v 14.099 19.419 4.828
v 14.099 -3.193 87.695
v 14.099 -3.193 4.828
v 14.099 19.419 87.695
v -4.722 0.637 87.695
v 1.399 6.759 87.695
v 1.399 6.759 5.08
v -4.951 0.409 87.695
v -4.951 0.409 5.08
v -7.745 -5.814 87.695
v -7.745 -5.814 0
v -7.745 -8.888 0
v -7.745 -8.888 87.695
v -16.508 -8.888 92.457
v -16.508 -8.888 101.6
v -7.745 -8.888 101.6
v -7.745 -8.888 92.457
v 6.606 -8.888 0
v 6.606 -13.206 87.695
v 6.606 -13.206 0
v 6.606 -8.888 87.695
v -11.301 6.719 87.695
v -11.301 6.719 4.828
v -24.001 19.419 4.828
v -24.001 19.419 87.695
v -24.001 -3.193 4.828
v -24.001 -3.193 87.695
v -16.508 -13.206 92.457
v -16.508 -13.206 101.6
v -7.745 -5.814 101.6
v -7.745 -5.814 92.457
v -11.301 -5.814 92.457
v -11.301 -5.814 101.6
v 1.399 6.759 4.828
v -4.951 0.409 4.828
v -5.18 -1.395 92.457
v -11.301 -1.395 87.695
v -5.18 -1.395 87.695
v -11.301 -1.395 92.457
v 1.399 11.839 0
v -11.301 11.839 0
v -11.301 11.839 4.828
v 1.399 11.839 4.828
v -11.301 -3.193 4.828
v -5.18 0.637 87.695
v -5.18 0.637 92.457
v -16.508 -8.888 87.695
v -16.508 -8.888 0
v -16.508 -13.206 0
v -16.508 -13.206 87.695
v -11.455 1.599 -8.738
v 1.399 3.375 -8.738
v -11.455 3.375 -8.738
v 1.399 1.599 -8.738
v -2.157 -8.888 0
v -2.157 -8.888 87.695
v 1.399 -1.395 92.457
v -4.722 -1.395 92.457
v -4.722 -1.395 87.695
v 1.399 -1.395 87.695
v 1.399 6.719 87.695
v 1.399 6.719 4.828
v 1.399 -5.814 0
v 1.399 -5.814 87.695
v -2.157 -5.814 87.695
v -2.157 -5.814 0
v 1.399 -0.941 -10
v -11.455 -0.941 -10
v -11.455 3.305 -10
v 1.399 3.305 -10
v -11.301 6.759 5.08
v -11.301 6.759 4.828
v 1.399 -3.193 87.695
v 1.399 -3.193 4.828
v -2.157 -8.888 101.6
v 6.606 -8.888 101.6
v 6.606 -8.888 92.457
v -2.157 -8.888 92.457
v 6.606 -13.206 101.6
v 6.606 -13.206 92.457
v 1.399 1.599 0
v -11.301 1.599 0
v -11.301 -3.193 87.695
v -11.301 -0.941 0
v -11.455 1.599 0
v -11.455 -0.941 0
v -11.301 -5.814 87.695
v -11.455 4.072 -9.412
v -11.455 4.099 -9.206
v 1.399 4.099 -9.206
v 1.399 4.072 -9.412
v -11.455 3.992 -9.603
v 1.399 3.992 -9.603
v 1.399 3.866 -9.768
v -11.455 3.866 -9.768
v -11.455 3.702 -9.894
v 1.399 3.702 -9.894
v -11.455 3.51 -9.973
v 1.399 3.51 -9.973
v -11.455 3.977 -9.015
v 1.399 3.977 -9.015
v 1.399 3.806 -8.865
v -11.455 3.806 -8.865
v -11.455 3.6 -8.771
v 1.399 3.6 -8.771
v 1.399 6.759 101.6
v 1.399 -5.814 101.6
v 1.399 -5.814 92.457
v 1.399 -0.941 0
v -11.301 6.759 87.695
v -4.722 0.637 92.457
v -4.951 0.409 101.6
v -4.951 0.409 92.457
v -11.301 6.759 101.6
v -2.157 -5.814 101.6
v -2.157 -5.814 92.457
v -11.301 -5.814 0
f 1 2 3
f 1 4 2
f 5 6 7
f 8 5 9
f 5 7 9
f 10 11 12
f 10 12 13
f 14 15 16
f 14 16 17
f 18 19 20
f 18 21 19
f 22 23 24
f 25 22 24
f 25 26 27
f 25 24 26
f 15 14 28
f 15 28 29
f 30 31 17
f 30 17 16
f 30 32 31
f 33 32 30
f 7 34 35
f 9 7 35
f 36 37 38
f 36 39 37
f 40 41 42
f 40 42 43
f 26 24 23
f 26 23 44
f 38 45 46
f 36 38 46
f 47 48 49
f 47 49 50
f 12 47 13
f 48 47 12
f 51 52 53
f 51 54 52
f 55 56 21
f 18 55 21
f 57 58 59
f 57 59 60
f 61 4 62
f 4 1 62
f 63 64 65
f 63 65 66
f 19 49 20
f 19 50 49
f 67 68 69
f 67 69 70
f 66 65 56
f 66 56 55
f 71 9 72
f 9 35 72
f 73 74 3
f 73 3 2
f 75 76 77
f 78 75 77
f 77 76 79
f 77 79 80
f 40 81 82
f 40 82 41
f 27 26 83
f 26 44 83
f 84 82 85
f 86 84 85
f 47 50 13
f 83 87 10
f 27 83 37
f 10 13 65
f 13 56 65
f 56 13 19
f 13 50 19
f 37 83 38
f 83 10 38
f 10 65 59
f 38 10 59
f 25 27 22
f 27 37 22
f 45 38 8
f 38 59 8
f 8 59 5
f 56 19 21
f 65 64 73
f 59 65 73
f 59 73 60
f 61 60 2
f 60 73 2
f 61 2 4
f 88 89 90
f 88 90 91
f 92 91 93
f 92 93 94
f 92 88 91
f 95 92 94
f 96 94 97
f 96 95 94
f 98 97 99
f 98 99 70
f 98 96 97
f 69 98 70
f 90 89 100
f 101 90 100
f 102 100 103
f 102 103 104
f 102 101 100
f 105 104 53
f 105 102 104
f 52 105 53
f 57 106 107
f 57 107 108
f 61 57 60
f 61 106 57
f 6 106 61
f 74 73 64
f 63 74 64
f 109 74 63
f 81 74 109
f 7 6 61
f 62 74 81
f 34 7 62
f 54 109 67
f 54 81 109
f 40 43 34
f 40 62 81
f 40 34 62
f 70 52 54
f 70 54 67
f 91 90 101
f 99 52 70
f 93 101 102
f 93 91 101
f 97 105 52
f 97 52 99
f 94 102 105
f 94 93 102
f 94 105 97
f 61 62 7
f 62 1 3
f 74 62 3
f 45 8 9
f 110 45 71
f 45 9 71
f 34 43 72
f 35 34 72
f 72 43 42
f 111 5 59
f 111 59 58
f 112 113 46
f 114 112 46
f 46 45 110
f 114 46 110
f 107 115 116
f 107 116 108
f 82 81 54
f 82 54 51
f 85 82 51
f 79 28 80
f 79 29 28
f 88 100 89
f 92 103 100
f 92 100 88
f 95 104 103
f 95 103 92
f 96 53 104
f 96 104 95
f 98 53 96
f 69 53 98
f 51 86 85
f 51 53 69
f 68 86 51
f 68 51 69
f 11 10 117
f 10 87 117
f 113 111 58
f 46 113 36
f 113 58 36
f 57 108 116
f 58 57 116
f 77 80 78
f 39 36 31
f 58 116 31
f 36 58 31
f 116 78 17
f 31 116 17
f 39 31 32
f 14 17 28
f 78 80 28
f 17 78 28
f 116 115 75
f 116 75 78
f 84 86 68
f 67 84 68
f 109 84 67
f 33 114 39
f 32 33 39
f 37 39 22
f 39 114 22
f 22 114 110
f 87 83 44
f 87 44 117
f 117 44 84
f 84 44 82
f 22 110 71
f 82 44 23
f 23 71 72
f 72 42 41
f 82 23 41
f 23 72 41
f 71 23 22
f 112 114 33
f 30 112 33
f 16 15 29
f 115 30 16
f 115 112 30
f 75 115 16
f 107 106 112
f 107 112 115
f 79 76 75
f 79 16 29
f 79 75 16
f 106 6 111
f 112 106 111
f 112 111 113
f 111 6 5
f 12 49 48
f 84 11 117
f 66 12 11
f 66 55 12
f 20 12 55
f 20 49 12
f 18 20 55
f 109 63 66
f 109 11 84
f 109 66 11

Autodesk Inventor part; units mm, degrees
ref_plane "YZ Plane" through (0, 0, 0) normal (1, 0, 0) x (0, 1, 0)
ref_plane "XZ Plane" through (0, 0, 0) normal (0, 1, 0) x (-1, 0, 0)
ref_plane "XY Plane" through (0, 0, 0) normal (0, 0, 1) x (1, 0, 0)
sketch "Sketch1" plane through (0, 0, 0) normal (0, 0, 1) x (1, 0, 0)
  line L0 (-11.300905, 6.75881) -> (1.399095, 6.75881)
  line L1 (1.399095, 6.75881) -> (1.399095, -5.94119)
  line L2 (1.399095, -5.94119) -> (-11.300905, -5.94119)
  line L3 (-11.300905, -5.94119) -> (-11.300905, 6.75881)
  line L4 (-11.300905, 6.75881) -> (-1.742504, 6.75881) construction
  line L5 (-11.300905, 6.75881) -> (-4.950905, 0.40881)
  line L6 (1.399095, 6.75881) -> (-4.950905, 0.40881)
  point P0 (0, 0)
  dimension "d0" = 12.7
  dimension "d1" = 12.7
sketch "Sketch1 outline for Extrusion1" plane through (0, 0, 0) normal (0, 0, 1) x (1, 0, 0)
  line L0 (-4.950905, 0.40881) -> (-11.300905, 6.75881)
  line L1 (1.399095, 6.75881) -> (-4.950905, 0.40881)
  line L2 (1.399095, -5.94119) -> (1.399095, 6.75881)
  line L3 (-11.300905, -5.94119) -> (1.399095, -5.94119)
  line L4 (-11.300905, 6.75881) -> (-11.300905, -5.94119)
extrude "Extrusion1" add sketch "Sketch1 outline for Extrusion1" along normal blind 101.6
sketch "Sketch1 outline for Extrusion2" plane through (0, 0, 0) normal (0, 0, 1) x (1, 0, 0)
  line L0 (1.399095, 6.75881) -> (-11.300905, 6.75881)
  line L1 (-4.950905, 0.40881) -> (1.399095, 6.75881)
  line L2 (-11.300905, 6.75881) -> (-4.950905, 0.40881)
extrude "Extrusion2" add sketch "Sketch1 outline for Extrusion2" along normal blind 5.08
sketch "Sketch2" plane through (-11.300905, 6.75881, 0) normal (0, 1, 0) x (1, 0, 0)
  line L0 (0, 0) -> (0, -101.6)
  line L1 (12.7, 0) -> (12.7, -101.6)
  line L2 (0, 0) -> (12.7, 0)
  line L3 (12.7, 0) -> (12.7, -5.078457)
  line L4 (12.7, -5.078457) -> (0, -5.078457)
  line L5 (0, -5.078457) -> (0, 0)
  point P0 (11.300905, 0)
sketch "Sketch2 outline for Extrusion3" plane through (-11.300905, 6.75881, 0) normal (0, 1, 0) x (1, 0, 0)
  line L0 (0, 0) -> (12.7, 0)
  line L1 (12.7, 0) -> (12.7, -5.078457)
  line L2 (12.7, -5.078457) -> (0, -5.078457)
  line L3 (0, -5.078457) -> (0, 0)
extrude "Extrusion3" add sketch "Sketch2 outline for Extrusion3" along normal blind 5.08
sketch "Sketch3" plane through (-11.300905, -5.94119, 0) normal (0, -1, 0) x (1, 0, 0)
  line L0 (12.7, 101.6) -> (6.35, 101.6) projected
  line L1 (0, 0) -> (12.7, 0) projected
  line L2 (9.4615, 101.6) -> (3.2385, 101.6)
  line L3 (3.2385, 101.6) -> (3.2385, 0)
  line L4 (3.2385, 0) -> (9.4615, 0)
  line L5 (9.4615, 0) -> (9.4615, 101.6)
  line L6 (6.35, 5.08) -> (6.35, 101.6) construction
  point P0 (11.300905, 0)
  dimension "d9" = 6.223
sketch "Sketch3 outline for Extrusion4" plane through (-11.300905, -5.94119, 0) normal (0, -1, 0) x (1, 0, 0)
  line L0 (9.4615, 0) -> (9.4615, 101.6)
  line L1 (3.2385, 0) -> (9.4615, 0)
  line L2 (3.2385, 101.6) -> (3.2385, 0)
  line L3 (9.4615, 101.6) -> (3.2385, 101.6)
extrude "Extrusion4" add sketch "Sketch3 outline for Extrusion4" along normal blind 7.3914
sketch "Sketch4" plane through (-1.839405, -5.94119, 101.6) normal (1, 0, 0) x (0, 0, -1)
  line L0 (101.6, -7.3914) -> (0, -7.3914) projected
  line L1 (101.6, 0) -> (101.6, -7.3914) projected
  line L2 (0, -7.3914) -> (101.6, -7.3914)
  line L3 (101.6, -7.3914) -> (101.6, -2.4384)
  line L4 (101.6, -2.4384) -> (0, -2.4384)
  line L5 (0, -2.4384) -> (0, -7.3914)
  point P0 (101.6, 5.94119)
  dimension "d12" = 4.953
sketch "Sketch5" plane through (-8.062405, -5.94119, 0) normal (-1, 0, 0) x (0, 0, 1)
  line L0 (0, -7.3914) -> (101.6, -7.3914) projected
  line L1 (0, 0) -> (0, -7.3914) projected
  line L2 (101.6, -7.3914) -> (0, -7.3914)
  line L3 (0, -7.3914) -> (0, -2.4384)
  line L4 (0, -2.4384) -> (101.6, -2.4384)
  line L5 (101.6, -2.4384) -> (101.6, -7.3914)
  point P0 (0, 5.94119)
  dimension "d13" = 4.953
sketch "Sketch5 outline for Extrusion5" plane through (-8.062405, -5.94119, 0) normal (-1, 0, 0) x (0, 0, 1)
  line L0 (0, -7.3914) -> (101.6, -7.3914)
  line L1 (0, -2.4384) -> (0, -7.3914)
  line L2 (101.6, -2.4384) -> (0, -2.4384)
  line L3 (101.6, -7.3914) -> (101.6, -2.4384)
extrude "Extrusion5" add sketch "Sketch5 outline for Extrusion5" along normal blind 8.763
sketch "Sketch4 outline for Extrusion6" plane through (-1.839405, -5.94119, 101.6) normal (1, 0, 0) x (0, 0, -1)
  line L0 (101.6, -7.3914) -> (101.6, -2.4384)
  line L1 (0, -7.3914) -> (101.6, -7.3914)
  line L2 (0, -2.4384) -> (0, -7.3914)
  line L3 (101.6, -2.4384) -> (0, -2.4384)
extrude "Extrusion6" add sketch "Sketch4 outline for Extrusion6" along normal blind 8.763
sketch "Sketch6" plane through (0, 0, 0) normal (0, 0, -1) x (-1, 0, 0)
  line L0 (-1.399095, -5.94119) -> (-1.399095, 6.75881)
  line L1 (-1.399095, 1.59881) -> (11.455496, 1.59881)
  line L2 (11.455496, 1.59881) -> (11.455496, -0.94119)
  line L3 (11.455496, -0.94119) -> (-1.399095, -0.94119)
  line L4 (-1.399095, -0.94119) -> (-1.399095, 1.59881)
  line L5 (11.300905, -5.94119) -> (8.062405, -5.94119)
  point P0 (0, 0)
  dimension "d18" = 2.54
  dimension "d19" = 5
sketch "Sketch6 outline for Extrusion7" plane through (0, 0, 0) normal (0, 0, -1) x (-1, 0, 0)
  line L0 (-1.399095, 1.59881) -> (11.455496, 1.59881)
  line L1 (11.455496, 1.59881) -> (11.455496, -0.94119)
  line L2 (11.455496, -0.94119) -> (-1.399095, -0.94119)
  line L3 (-1.399095, -0.94119) -> (-1.399095, 1.59881)
extrude "Extrusion7" add sketch "Sketch6 outline for Extrusion7" along normal blind 10
sketch "Sketch7" plane through (-11.300905, 1.59881, 0) normal (0, 1, 0) x (1, 0, 0)
  line L0 (-0.154591, 0) -> (-0.154591, 10)
  line L1 (12.7, 0) -> (12.7, 10)
  line L2 (-0.154591, 10) -> (12.7, 10)
  line L3 (12.7, 10) -> (12.7, 8.73819)
  line L4 (12.7, 8.73819) -> (-0.154591, 8.73819)
  line L5 (-0.154591, 8.73819) -> (-0.154591, 10)
  point P0 (11.300905, 0)
sketch "Sketch7 outline for Extrusion8" plane through (-11.300905, 1.59881, 0) normal (0, 1, 0) x (1, 0, 0)
  line L0 (-0.154591, 10) -> (12.7, 10)
  line L1 (12.7, 10) -> (12.7, 8.73819)
  line L2 (12.7, 8.73819) -> (-0.154591, 8.73819)
  line L3 (-0.154591, 8.73819) -> (-0.154591, 10)
extrude "Extrusion8" add sketch "Sketch7 outline for Extrusion8" along normal blind 2.5
fillet "Fillet1" radius 0.79375 2 edges at (-5.0282, 4.0988, -10) (-5.0282, 4.0988, -8.7382)
sketch "Sketch8" plane through (-11.300905, -13.33259, 0) normal (0, -1, 0) x (1, 0, 0)
  line L0 (18.2245, 101.6) -> (18.2245, 0)
  line L1 (-5.5245, 0) -> (-5.5245, 101.6)
  line L2 (18.2245, 92.457351) -> (-5.5245, 92.457351)
  line L3 (-5.5245, 92.457351) -> (-5.5245, 87.694851)
  line L4 (-5.5245, 87.694851) -> (18.2245, 87.694851)
  line L5 (18.2245, 87.694851) -> (18.2245, 92.457351)
  point P0 (11.300905, 0)
  dimension "d25" = 4.7625
sketch "Sketch8 outline for Extrusion9" plane through (-11.300905, -13.33259, 0) normal (0, -1, 0) x (1, 0, 0)
  line L0 (18.2245, 87.694851) -> (18.2245, 92.457351)
  line L1 (-5.5245, 87.694851) -> (18.2245, 87.694851)
  line L2 (-5.5245, 92.457351) -> (-5.5245, 87.694851)
  line L3 (18.2245, 92.457351) -> (-5.5245, 92.457351)
extrude "Extrusion9" cut sketch "Sketch8 outline for Extrusion9" against normal blind 13.97
sketch "Sketch9" plane through (-11.300905, -13.33259, 0) normal (0, -1, 0) x (1, 0, 0)
  line L0 (-5.5245, 101.6) -> (18.2245, 101.6) projected
  line L1 (3.2385, 0) -> (-5.5245, 0) projected
  line L2 (18.2245, 101.6) -> (-5.5245, 101.6)
  line L3 (-5.5245, 101.6) -> (-5.5245, 0)
  line L4 (-5.5245, 0) -> (18.2245, 0)
  line L5 (18.2245, 0) -> (18.2245, 101.6)
  point P0 (11.300905, 0)
sketch "Sketch9 outline for Extrusion10" plane through (-11.300905, -13.33259, 0) normal (0, -1, 0) x (1, 0, 0)
  line L0 (18.2245, 0) -> (18.2245, 101.6)
  line L1 (-5.5245, 0) -> (18.2245, 0)
  line L2 (-5.5245, 101.6) -> (-5.5245, 0)
  line L3 (18.2245, 101.6) -> (-5.5245, 101.6)
extrude "Extrusion10" cut sketch "Sketch9 outline for Extrusion10" against normal blind 0.127
sketch "Sketch10" plane through (-1.839405, -5.94119, 101.6) normal (0, -1, 0) x (1, 0, 0)
  line L0 (3.2385, -9.142649) -> (3.2385, 0)
  line L1 (0, -13.905149) -> (0, -101.6)
  line L2 (3.2385, 0) -> (0, 0)
  line L3 (0, 0) -> (0, -101.6)
  line L4 (0, -101.6) -> (3.2385, -101.6)
  line L5 (3.2385, -101.6) -> (3.2385, 0)
  line L6 (-9.4615, -9.142649) -> (-9.4615, 0)
  line L7 (-9.4615, -101.6) -> (3.2385, -101.6)
  line L8 (-9.4615, 0) -> (-5.941969, 0)
  line L9 (-5.941969, 0) -> (-5.941969, -101.6)
  line L10 (-5.941969, -101.6) -> (-9.4615, -101.6)
  line L11 (-9.4615, -101.6) -> (-9.4615, 0)
  point P0 (1.839405, -101.6)
sketch "Sketch10 outline for Extrusion11" plane through (-1.839405, -5.94119, 101.6) normal (0, -1, 0) x (1, 0, 0)
  line L0 (3.2385, -101.6) -> (3.2385, 0)
  line L1 (0, -101.6) -> (3.2385, -101.6)
  line L2 (0, 0) -> (0, -101.6)
  line L3 (3.2385, 0) -> (0, 0)
  line L4 (-9.4615, -101.6) -> (-5.941969, -101.6)
  line L5 (-9.4615, 0) -> (-9.4615, -101.6)
  line L6 (-5.941969, 0) -> (-9.4615, 0)
  line L7 (-5.941969, -101.6) -> (-5.941969, 0)
extrude "Extrusion11" cut sketch "Sketch10 outline for Extrusion11" against normal blind 0.127
sketch "Sketch11" plane through (6.923595, -5.94119, 101.6) normal (1, 0, 0) x (0, 0, -1)
  line L0 (0, -2.4384) -> (9.142649, -2.4384)
  line L1 (0, -2.4384) -> (101.6, -2.4384)
  line L2 (101.6, -2.4384) -> (101.6, -7.2644)
  line L3 (101.6, -7.2644) -> (0, -7.2644)
  line L4 (0, -7.2644) -> (0, -2.4384)
  point P0 (101.6, 5.94119)
sketch "Sketch11 outline for Extrusion12" plane through (6.923595, -5.94119, 101.6) normal (1, 0, 0) x (0, 0, -1)
  line L0 (0, -2.4384) -> (101.6, -2.4384)
  line L1 (101.6, -2.4384) -> (101.6, -7.2644)
  line L2 (101.6, -7.2644) -> (0, -7.2644)
  line L3 (0, -7.2644) -> (0, -2.4384)
extrude "Extrusion12" cut sketch "Sketch11 outline for Extrusion12" against normal blind 0.0635
sketch "Sketch12" plane through (-16.825405, -5.94119, 0) normal (-1, 0, 0) x (0, 0, 1)
  line L0 (101.6, -7.2644) -> (101.6, -2.4384) projected
  line L1 (0, 0) -> (0, -2.4384) projected
  line L2 (101.6, -7.2644) -> (0, -7.2644)
  line L3 (0, -7.2644) -> (0, -2.4384)
  line L4 (0, -2.4384) -> (101.6, -2.4384)
  line L5 (101.6, -2.4384) -> (101.6, -7.2644)
  point P0 (0, 5.94119)
sketch "Sketch12 outline for Extrusion13" plane through (-16.825405, -5.94119, 0) normal (-1, 0, 0) x (0, 0, 1)
  line L0 (101.6, -7.2644) -> (0, -7.2644)
  line L1 (0, -7.2644) -> (0, -2.4384)
  line L2 (0, -2.4384) -> (101.6, -2.4384)
  line L3 (101.6, -2.4384) -> (101.6, -7.2644)
extrude "Extrusion13" cut sketch "Sketch12 outline for Extrusion13" against normal blind 0.0635
sketch "Sketch13" plane through (-7.781374, -5.94119, 92.457351) normal (-1, 0, 0) x (0, 0, 1)
  line L0 (-92.457351, 0.127) -> (-4.7625, 0.127)
  line L1 (9.142649, -2.4384) -> (9.142649, 0.127)
  line L2 (-92.457351, 0.127) -> (9.142649, 0.127)
  line L3 (9.142649, 0.127) -> (9.142649, 0.002557)
  line L4 (9.142649, 0.002557) -> (-92.457351, 0.002557)
  line L5 (-92.457351, 0.002557) -> (-92.457351, 0.127)
  point P0 (-92.457351, 5.94119)
sketch "Sketch14" plane through (-7.781374, -5.94119, 0) normal (-1, 0, 0) x (0, 0, 1)
  line L0 (0, 0.127) -> (87.694851, 0.127)
  line L1 (92.457351, 0) -> (101.6, 0)
  line L2 (0, 0.127) -> (101.6, 0.127)
  line L3 (101.6, 0.127) -> (101.6, 0)
  line L4 (101.6, 0) -> (0, 0)
  line L5 (0, 0) -> (0, 0.127)
  point P0 (0, 5.94119)
sketch "Sketch14 outline for Extrusion14" plane through (-7.781374, -5.94119, 0) normal (-1, 0, 0) x (0, 0, 1)
  line L0 (0, 0.127) -> (101.6, 0.127)
  line L1 (101.6, 0.127) -> (101.6, 0)
  line L2 (101.6, 0) -> (0, 0)
  line L3 (0, 0) -> (0, 0.127)
extrude "Extrusion14" add sketch "Sketch14 outline for Extrusion14" along normal blind 0.28194
sketch "Sketch15" plane through (-1.839405, -8.37959, 87.694851) normal (1, 0, 0) x (0, 0, -1)
  line L0 (-4.7625, 2.5654) -> (-13.905149, 2.5654)
  line L1 (87.694851, 2.4384) -> (87.694851, 0)
  line L2 (-13.905149, 2.5654) -> (87.694851, 2.5654)
  line L3 (87.694851, 2.5654) -> (87.694851, 0)
  line L4 (87.694851, 0) -> (-13.905149, 0)
  line L5 (-13.905149, 0) -> (-13.905149, 2.5654)
  point P0 (87.694851, 8.37959)
sketch "Sketch15 outline for Extrusion15" plane through (-1.839405, -8.37959, 87.694851) normal (1, 0, 0) x (0, 0, -1)
  line L0 (-13.905149, 2.5654) -> (87.694851, 2.5654)
  line L1 (87.694851, 2.5654) -> (87.694851, 0)
  line L2 (87.694851, 0) -> (-13.905149, 0)
  line L3 (-13.905149, 0) -> (-13.905149, 2.5654)
extrude "Extrusion15" cut sketch "Sketch15 outline for Extrusion15" against normal blind 0.0635
sketch "Sketch16" plane through (-8.062405, -8.37959, 0) normal (-1, 0, 0) x (0, 0, 1)
  line L0 (101.6, 2.5654) -> (92.457351, 2.5654)
  line L1 (0, -4.826) -> (0, 0)
  line L2 (101.6, 2.5654) -> (0, 2.5654)
  line L3 (0, 2.5654) -> (0, 0)
  line L4 (0, 0) -> (101.6, 0)
  line L5 (101.6, 0) -> (101.6, 2.5654)
  point P0 (0, 8.37959)
sketch "Sketch16 outline for Extrusion16" plane through (-8.062405, -8.37959, 0) normal (-1, 0, 0) x (0, 0, 1)
  line L0 (101.6, 0) -> (101.6, 2.5654)
  line L1 (0, 0) -> (101.6, 0)
  line L2 (0, 2.5654) -> (0, 0)
  line L3 (101.6, 2.5654) -> (0, 2.5654)
extrude "Extrusion16" cut sketch "Sketch16 outline for Extrusion16" against normal blind 0.0635
sketch "Sketch17" plane through (-11.300905, 0.63741, 0) normal (0, -1, 0) x (1, 0, 0)
  point P0 (11.300905, 0)
sketch "Sketch18" plane through (6.860095, -8.37959, 101.6) normal (0, 1, 0) x (1, 0, 0)
  line L0 (0, 0) -> (0, 9.142649)
  line L1 (-8.763, 9.142649) -> (0, 9.142649)
  line L2 (0, 0) -> (-8.763, 0)
  line L3 (-8.763, 0) -> (-8.763, 9.142649)
  line L4 (-8.763, 9.142649) -> (0, 9.142649)
  line L5 (0, 9.142649) -> (0, 0)
  line L6 (-14.859, 0) -> (-23.622, 0)
  line L7 (-14.859, 9.142649) -> (-23.622, 9.142649)
  line L8 (-14.859, 0) -> (-23.622, 0)
  line L9 (-23.622, 0) -> (-23.622, 9.142649)
  line L10 (-23.622, 9.142649) -> (-14.859, 9.142649)
  line L11 (-14.859, 9.142649) -> (-14.859, 0)
  line L12 (-8.763, 13.905149) -> (0, 13.905149)
  line L13 (-5.461, 101.6) -> (-18.161, 101.6)
  line L14 (0, 13.905149) -> (-8.763, 13.905149)
  line L15 (-8.763, 13.905149) -> (-8.763, 101.6)
  line L16 (-8.763, 101.6) -> (0, 101.6)
  line L17 (0, 101.6) -> (0, 13.905149)
  line L18 (-23.622, 13.905149) -> (-14.859, 13.905149)
  line L19 (-14.923409, 101.6) -> (-14.923409, 13.905149)
  line L20 (-23.622, 13.905149) -> (-14.923409, 13.905149)
  line L21 (-14.923409, 13.905149) -> (-14.923409, 101.6)
  line L22 (-14.923409, 101.6) -> (-23.622, 101.6)
  line L23 (-23.622, 101.6) -> (-23.622, 13.905149)
  point P0 (-6.860095, 101.6)
sketch "Sketch18 outline for Extrusion17" plane through (6.860095, -8.37959, 101.6) normal (0, 1, 0) x (1, 0, 0)
  line L0 (-8.763, 0) -> (0, 0)
  line L1 (-8.763, 9.142649) -> (-8.763, 0)
  line L2 (0, 9.142649) -> (-8.763, 9.142649)
  line L3 (0, 0) -> (0, 9.142649)
  line L4 (-14.859, 0) -> (-23.622, 0)
  line L5 (-23.622, 0) -> (-23.622, 9.142649)
  line L6 (-23.622, 9.142649) -> (-14.859, 9.142649)
  line L7 (-14.859, 9.142649) -> (-14.859, 0)
  line L8 (-14.923409, 13.905149) -> (-14.923409, 101.6)
  line L9 (-23.622, 13.905149) -> (-14.923409, 13.905149)
  line L10 (-23.622, 101.6) -> (-23.622, 13.905149)
  line L11 (-14.923409, 101.6) -> (-23.622, 101.6)
  line L12 (-8.763, 13.905149) -> (0, 13.905149)
  line L13 (-8.763, 101.6) -> (-8.763, 13.905149)
  line L14 (0, 101.6) -> (-8.763, 101.6)
  line L15 (0, 13.905149) -> (0, 101.6)
extrude "Extrusion17" cut sketch "Sketch18 outline for Extrusion17" against normal blind 0.508
sketch "Sketch19" plane through (6.860095, -5.94119, 101.6) normal (1, 0, 0) x (0, 0, -1)
  line L0 (0, 0.127) -> (0, -2.9464)
  line L1 (13.905149, -7.2644) -> (101.6, -7.2644)
  line L2 (0, -2.9464) -> (101.6, -2.9464)
  line L3 (101.6, -2.9464) -> (101.6, -7.2644)
  line L4 (101.6, -7.2644) -> (0, -7.2644)
  line L5 (0, -7.2644) -> (0, -2.9464)
  point P0 (101.6, 5.94119)
sketch "Sketch19 outline for Extrusion18" plane through (6.860095, -5.94119, 101.6) normal (1, 0, 0) x (0, 0, -1)
  line L0 (0, -2.9464) -> (101.6, -2.9464)
  line L1 (101.6, -2.9464) -> (101.6, -7.2644)
  line L2 (101.6, -7.2644) -> (0, -7.2644)
  line L3 (0, -7.2644) -> (0, -2.9464)
extrude "Extrusion18" cut sketch "Sketch19 outline for Extrusion18" against normal blind 0.254
sketch "Sketch20" plane through (-16.761905, -5.94119, 0) normal (-1, 0, 0) x (0, 0, 1)
  line L0 (87.694851, -2.9464) -> (0, -2.9464)
  line L1 (101.6, -7.2644) -> (92.457351, -7.2644)
  line L2 (0, -2.9464) -> (101.6, -2.9464)
  line L3 (101.6, -2.9464) -> (101.6, -7.2644)
  line L4 (101.6, -7.2644) -> (0, -7.2644)
  line L5 (0, -7.2644) -> (0, -2.9464)
  point P0 (0, 5.94119)
sketch "Sketch20 outline for Extrusion19" plane through (-16.761905, -5.94119, 0) normal (-1, 0, 0) x (0, 0, 1)
  line L0 (0, -2.9464) -> (101.6, -2.9464)
  line L1 (101.6, -2.9464) -> (101.6, -7.2644)
  line L2 (101.6, -7.2644) -> (0, -7.2644)
  line L3 (0, -7.2644) -> (0, -2.9464)
extrude "Extrusion19" cut sketch "Sketch20 outline for Extrusion19" against normal blind 0.254
sketch "Sketch21" plane through (-11.300905, 6.75881, 5.08) normal (-1, 0, 0) x (0, 0, 1)
  line L0 (82.614851, -12.573) -> (-5.08, -12.573)
  line L1 (96.52, -12.573) -> (96.52, -15.6464)
  line L2 (-5.08, -12.573) -> (96.52, -12.573)
  line L3 (96.52, -12.573) -> (96.52, -15.6464)
  line L4 (96.52, -15.6464) -> (-5.08, -15.6464)
  line L5 (-5.08, -15.6464) -> (-5.08, -12.573)
  point P0 (-5.08, -6.75881)
sketch "Sketch21 outline for Extrusion20" plane through (-11.300905, 6.75881, 5.08) normal (-1, 0, 0) x (0, 0, 1)
  line L0 (-5.08, -12.573) -> (96.52, -12.573)
  line L1 (96.52, -12.573) -> (96.52, -15.6464)
  line L2 (96.52, -15.6464) -> (-5.08, -15.6464)
  line L3 (-5.08, -15.6464) -> (-5.08, -12.573)
extrude "Extrusion20" cut sketch "Sketch21 outline for Extrusion20" against normal blind 3.302
sketch "Sketch22" plane through (-1.902905, -8.37959, 87.694851) normal (1, 0, 0) x (0, 0, -1)
  line L0 (0, 2.5654) -> (87.694851, 2.5654)
  line L1 (-4.7625, -0.508) -> (-13.905149, -0.508)
  line L2 (87.694851, 2.5654) -> (-13.905149, 2.5654)
  line L3 (-13.905149, 2.5654) -> (-13.905149, -0.508)
  line L4 (-13.905149, -0.508) -> (87.694851, -0.508)
  line L5 (87.694851, -0.508) -> (87.694851, 2.5654)
  point P0 (87.694851, 8.37959)
sketch "Sketch22 outline for Extrusion21" plane through (-1.902905, -8.37959, 87.694851) normal (1, 0, 0) x (0, 0, -1)
  line L0 (87.694851, -0.508) -> (87.694851, 2.5654)
  line L1 (-13.905149, -0.508) -> (87.694851, -0.508)
  line L2 (-13.905149, 2.5654) -> (-13.905149, -0.508)
  line L3 (87.694851, 2.5654) -> (-13.905149, 2.5654)
extrude "Extrusion21" cut sketch "Sketch22 outline for Extrusion21" against normal blind 0.254
sketch "Sketch23" plane through (-7.998905, -8.37959, 0) normal (-1, 0, 0) x (0, 0, 1)
  line L0 (87.694851, 2.5654) -> (0, 2.5654)
  line L1 (0, 2.5654) -> (101.6, 2.5654)
  line L2 (101.6, 2.5654) -> (101.6, -0.508)
  line L3 (101.6, -0.508) -> (0, -0.508)
  line L4 (0, -0.508) -> (0, 2.5654)
  point P0 (0, 8.37959)
sketch "Sketch23 outline for Extrusion22" plane through (-7.998905, -8.37959, 0) normal (-1, 0, 0) x (0, 0, 1)
  line L0 (0, 2.5654) -> (101.6, 2.5654)
  line L1 (101.6, 2.5654) -> (101.6, -0.508)
  line L2 (101.6, -0.508) -> (0, -0.508)
  line L3 (0, -0.508) -> (0, 2.5654)
extrude "Extrusion22" cut sketch "Sketch23 outline for Extrusion22" against normal blind 0.254
sketch "Sketch24" plane through (1.399095, 6.75881, 101.6) normal (1, 0, 0) x (0, 0, -1)
  point P0 (101.6, -6.75881)
sketch "Sketch25" plane through (0, 0, 5.08) normal (0, 0, 1) x (1, 0, 0)
  line L0 (1.399095, 6.75881) -> (-4.950905, 0.40881)
  line L1 (-4.950905, 0.40881) -> (-25.57382, 21.031726)
  line L2 (-25.57382, 21.031726) -> (15.67201, 21.031726)
  line L3 (15.67201, 21.031726) -> (-4.950905, 0.40881)
  point P0 (0, 0)
sketch "Sketch26" plane through (1.399095, 6.75881, 101.6) normal (1, 0, 0) x (0, 0, -1)
  line L0 (101.6, -12.573) -> (13.905149, -12.573)
  line L1 (13.905149, -12.573) -> (96.533031, -12.573)
  line L2 (96.533031, -12.573) -> (96.533031, 14.285186)
  line L3 (96.533031, 14.285186) -> (13.905149, 14.285186)
  line L4 (13.905149, 14.285186) -> (13.905149, -12.573)
  point P0 (101.6, -6.75881)
sketch "Sketch26 outline for Extrusion23" plane through (1.399095, 6.75881, 101.6) normal (1, 0, 0) x (0, 0, -1)
  line L0 (13.905149, 14.285186) -> (13.905149, -12.573)
  line L1 (96.533031, 14.285186) -> (13.905149, 14.285186)
  line L2 (96.533031, -12.573) -> (96.533031, 14.285186)
  line L3 (13.905149, -12.573) -> (96.533031, -12.573)
extrude "Extrusion23" add sketch "Sketch26 outline for Extrusion23" against normal blind 12.7
sketch "Sketch27" plane through (1.399095, 1.59881, 0) normal (1, 0, 0) x (0, 0, -1)
  line L0 (-87.694851, 19.445186) -> (-87.694851, 5.16)
  line L1 (-87.694851, 19.445186) -> (-4.828406, 19.445186)
  line L2 (-4.828406, 19.445186) -> (-4.828406, -4.791789)
  line L3 (-4.828406, -4.791789) -> (-87.694851, -4.791789)
  line L4 (-87.694851, -4.791789) -> (-87.694851, 19.445186)
  point P0 (0, -1.59881)
sketch "Sketch27 outline for Extrusion24" plane through (1.399095, 1.59881, 0) normal (1, 0, 0) x (0, 0, -1)
  line L0 (-87.694851, 19.445186) -> (-4.828406, 19.445186)
  line L1 (-4.828406, 19.445186) -> (-4.828406, -4.791789)
  line L2 (-4.828406, -4.791789) -> (-87.694851, -4.791789)
  line L3 (-87.694851, -4.791789) -> (-87.694851, 19.445186)
extrude "Extrusion24" add sketch "Sketch27 outline for Extrusion24" along normal blind 12.7
sketch "Sketch28" plane through (-11.300905, 1.59881, 0) normal (-1, 0, 0) x (0, 0, 1)
  line L0 (87.694851, 19.445186) -> (5.066969, 19.445186)
  line L1 (4.828406, 10.24) -> (4.828406, -4.791789)
  line L2 (87.694851, 19.445186) -> (4.828406, 19.445186)
  line L3 (4.828406, 19.445186) -> (4.828406, -4.791789)
  line L4 (4.828406, -4.791789) -> (87.694851, -4.791789)
  line L5 (87.694851, -4.791789) -> (87.694851, 19.445186)
  point P0 (0, -1.59881)
sketch "Sketch28 outline for Extrusion25" plane through (-11.300905, 1.59881, 0) normal (-1, 0, 0) x (0, 0, 1)
  line L0 (87.694851, -4.791789) -> (87.694851, 19.445186)
  line L1 (4.828406, -4.791789) -> (87.694851, -4.791789)
  line L2 (4.828406, 19.445186) -> (4.828406, -4.791789)
  line L3 (87.694851, 19.445186) -> (4.828406, 19.445186)
extrude "Extrusion25" add sketch "Sketch28 outline for Extrusion25" along normal blind 12.7
sketch "Sketch25 outline for Extrusion26" plane through (0, 0, 5.08) normal (0, 0, 1) x (1, 0, 0)
  line L0 (-4.950905, 0.40881) -> (-25.57382, 21.031726)
  line L1 (-25.57382, 21.031726) -> (15.67201, 21.031726)
  line L2 (15.67201, 21.031726) -> (-4.950905, 0.40881)
extrude "Extrusion26" cut sketch "Sketch25 outline for Extrusion26" along normal blind 101.6
sketch "Sketch29" plane through (1.399095, 21.043996, 4.828406) normal (0, 1, 0) x (1, 0, 0)
  line L0 (-25.4, 0) -> (12.7, 0)
  line L1 (12.7, 0) -> (12.7, -82.866444)
  line L2 (12.7, -82.866444) -> (-25.4, -82.866444)
  line L3 (-25.4, -82.866444) -> (-25.4, 0)
  point P0 (-1.399095, 4.828406)
sketch "Sketch29 outline for Extrusion27" plane through (1.399095, 21.043996, 4.828406) normal (0, 1, 0) x (1, 0, 0)
  line L0 (-25.4, 0) -> (12.7, 0)
  line L1 (12.7, 0) -> (12.7, -82.866444)
  line L2 (12.7, -82.866444) -> (-25.4, -82.866444)
  line L3 (-25.4, -82.866444) -> (-25.4, 0)
extrude "Extrusion27" cut sketch "Sketch29 outline for Extrusion27" against normal blind 1.27
sketch "Sketch30" plane through (-11.300905, -3.192978, 4.828406) normal (0, 0, -1) x (-1, 0, 0)
  line L0 (0, 15.031789) -> (0, 4.791789)
  line L1 (0, 9.911789) -> (12.7, 22.611789)
  line L2 (12.7, 0) -> (12.7, 22.651789)
  line L3 (0, 9.911789) -> (17.960512, 9.911789) construction
  line L4 (12.7, 22.611789) -> (19.140166, 29.051955)
  line L5 (-12.7, 4.791789) -> (-12.7, 15.031789)
  line L6 (-12.7, 9.911789) -> (-28.620083, 25.831872)
  line L7 (-12.7, 9.911789) -> (9.814397, 9.911789) construction
  line L8 (-28.620083, 25.831872) -> (-31.840166, 29.051955)
  line L9 (-31.840166, 29.051955) -> (19.140166, 29.051955)
  line L10 (-25.4, 0) -> (-25.4, 22.966975)
  line L11 (-12.7, 9.951789) -> (-6.35, 3.601789)
  line L12 (-12.7, 9.911789) -> (-6.35, 3.601789)
  line L13 (-6.35, 3.601789) -> (0, 9.951789)
  line L14 (-6.35, 3.601789) -> (0, 9.951789)
  point P0 (-11.300905, 3.192978)
  dimension "d64" = 45
  dimension "d65" = 135
sketch "Sketch30 outline for Extrusion28" plane through (-11.300905, -3.192978, 4.828406) normal (0, 0, -1) x (-1, 0, 0)
  line L0 (0, 9.951789) -> (0, 9.911789)
  line L1 (-6.35, 3.601789) -> (0, 9.951789)
  line L2 (-12.7, 9.951789) -> (-6.35, 3.601789)
  line L3 (-12.7, 9.911789) -> (-12.7, 9.951789)
  line L4 (-28.620083, 25.831872) -> (-12.7, 9.911789)
  line L5 (-31.840166, 29.051955) -> (-28.620083, 25.831872)
  line L6 (19.140166, 29.051955) -> (-31.840166, 29.051955)
  line L7 (12.7, 22.611789) -> (19.140166, 29.051955)
  line L8 (0, 9.911789) -> (12.7, 22.611789)
extrude "Extrusion28" cut sketch "Sketch30 outline for Extrusion28" against normal blind 152.4
sketch "Sketch31" plane through (1.399095, 1.59881, 0) normal (1, 0, 0) x (0, 0, -1)
  line L0 (-92.457351, -0.9614) -> (-92.457351, -7.413)
  line L1 (-87.694851, -10.4864) -> (-87.694851, -7.413)
  line L2 (-92.457351, -4.418125) -> (-87.694851, -4.418125)
  line L3 (-87.694851, -4.418125) -> (-87.694851, -9.88761)
  line L4 (-87.694851, -9.88761) -> (-92.457351, -9.88761)
  line L5 (-92.457351, -9.88761) -> (-92.457351, -4.418125)
  point P0 (0, -1.59881)
sketch "Sketch31 outline for Extrusion29" plane through (1.399095, 1.59881, 0) normal (1, 0, 0) x (0, 0, -1)
  line L0 (-92.457351, -4.418125) -> (-87.694851, -4.418125)
  line L1 (-87.694851, -4.418125) -> (-87.694851, -9.88761)
  line L2 (-87.694851, -9.88761) -> (-92.457351, -9.88761)
  line L3 (-92.457351, -9.88761) -> (-92.457351, -4.418125)
extrude "Extrusion29" cut sketch "Sketch31 outline for Extrusion29" against normal blind 50.8
sketch "Sketch32" plane through (-11.300905, 0.63741, 0) normal (0, -1, 0) x (1, 0, 0)
  line L0 (12.7, 87.694851) -> (6.5786, 87.694851)
  line L1 (6.5786, 92.457351) -> (12.7, 92.457351)
  line L2 (12.7, 87.694851) -> (6.5786, 87.694851)
  line L3 (6.5786, 87.694851) -> (6.5786, 92.457351)
  line L4 (6.5786, 92.457351) -> (12.7, 92.457351)
  line L5 (12.7, 92.457351) -> (12.7, 87.694851)
  line L6 (6.1214, 87.694851) -> (0, 87.694851)
  line L7 (0, 4.828406) -> (0, 101.6)
  line L8 (6.1214, 87.694851) -> (0, 87.694851)
  line L9 (0, 87.694851) -> (0, 92.457351)
  line L10 (0, 92.457351) -> (6.1214, 92.457351)
  line L11 (6.1214, 92.457351) -> (6.1214, 87.694851)
  point P0 (11.300905, 0)
sketch "Sketch32 outline for Extrusion30" plane through (-11.300905, 0.63741, 0) normal (0, -1, 0) x (1, 0, 0)
  line L0 (12.7, 87.694851) -> (6.5786, 87.694851)
  line L1 (6.5786, 87.694851) -> (6.5786, 92.457351)
  line L2 (6.5786, 92.457351) -> (12.7, 92.457351)
  line L3 (12.7, 92.457351) -> (12.7, 87.694851)
  line L4 (0, 87.694851) -> (6.1214, 87.694851)
  line L5 (0, 92.457351) -> (0, 87.694851)
  line L6 (6.1214, 92.457351) -> (0, 92.457351)
  line L7 (6.1214, 87.694851) -> (6.1214, 92.457351)
extrude "Extrusion30" add sketch "Sketch32 outline for Extrusion30" along normal blind 2.032
properties part number "structureholder"
